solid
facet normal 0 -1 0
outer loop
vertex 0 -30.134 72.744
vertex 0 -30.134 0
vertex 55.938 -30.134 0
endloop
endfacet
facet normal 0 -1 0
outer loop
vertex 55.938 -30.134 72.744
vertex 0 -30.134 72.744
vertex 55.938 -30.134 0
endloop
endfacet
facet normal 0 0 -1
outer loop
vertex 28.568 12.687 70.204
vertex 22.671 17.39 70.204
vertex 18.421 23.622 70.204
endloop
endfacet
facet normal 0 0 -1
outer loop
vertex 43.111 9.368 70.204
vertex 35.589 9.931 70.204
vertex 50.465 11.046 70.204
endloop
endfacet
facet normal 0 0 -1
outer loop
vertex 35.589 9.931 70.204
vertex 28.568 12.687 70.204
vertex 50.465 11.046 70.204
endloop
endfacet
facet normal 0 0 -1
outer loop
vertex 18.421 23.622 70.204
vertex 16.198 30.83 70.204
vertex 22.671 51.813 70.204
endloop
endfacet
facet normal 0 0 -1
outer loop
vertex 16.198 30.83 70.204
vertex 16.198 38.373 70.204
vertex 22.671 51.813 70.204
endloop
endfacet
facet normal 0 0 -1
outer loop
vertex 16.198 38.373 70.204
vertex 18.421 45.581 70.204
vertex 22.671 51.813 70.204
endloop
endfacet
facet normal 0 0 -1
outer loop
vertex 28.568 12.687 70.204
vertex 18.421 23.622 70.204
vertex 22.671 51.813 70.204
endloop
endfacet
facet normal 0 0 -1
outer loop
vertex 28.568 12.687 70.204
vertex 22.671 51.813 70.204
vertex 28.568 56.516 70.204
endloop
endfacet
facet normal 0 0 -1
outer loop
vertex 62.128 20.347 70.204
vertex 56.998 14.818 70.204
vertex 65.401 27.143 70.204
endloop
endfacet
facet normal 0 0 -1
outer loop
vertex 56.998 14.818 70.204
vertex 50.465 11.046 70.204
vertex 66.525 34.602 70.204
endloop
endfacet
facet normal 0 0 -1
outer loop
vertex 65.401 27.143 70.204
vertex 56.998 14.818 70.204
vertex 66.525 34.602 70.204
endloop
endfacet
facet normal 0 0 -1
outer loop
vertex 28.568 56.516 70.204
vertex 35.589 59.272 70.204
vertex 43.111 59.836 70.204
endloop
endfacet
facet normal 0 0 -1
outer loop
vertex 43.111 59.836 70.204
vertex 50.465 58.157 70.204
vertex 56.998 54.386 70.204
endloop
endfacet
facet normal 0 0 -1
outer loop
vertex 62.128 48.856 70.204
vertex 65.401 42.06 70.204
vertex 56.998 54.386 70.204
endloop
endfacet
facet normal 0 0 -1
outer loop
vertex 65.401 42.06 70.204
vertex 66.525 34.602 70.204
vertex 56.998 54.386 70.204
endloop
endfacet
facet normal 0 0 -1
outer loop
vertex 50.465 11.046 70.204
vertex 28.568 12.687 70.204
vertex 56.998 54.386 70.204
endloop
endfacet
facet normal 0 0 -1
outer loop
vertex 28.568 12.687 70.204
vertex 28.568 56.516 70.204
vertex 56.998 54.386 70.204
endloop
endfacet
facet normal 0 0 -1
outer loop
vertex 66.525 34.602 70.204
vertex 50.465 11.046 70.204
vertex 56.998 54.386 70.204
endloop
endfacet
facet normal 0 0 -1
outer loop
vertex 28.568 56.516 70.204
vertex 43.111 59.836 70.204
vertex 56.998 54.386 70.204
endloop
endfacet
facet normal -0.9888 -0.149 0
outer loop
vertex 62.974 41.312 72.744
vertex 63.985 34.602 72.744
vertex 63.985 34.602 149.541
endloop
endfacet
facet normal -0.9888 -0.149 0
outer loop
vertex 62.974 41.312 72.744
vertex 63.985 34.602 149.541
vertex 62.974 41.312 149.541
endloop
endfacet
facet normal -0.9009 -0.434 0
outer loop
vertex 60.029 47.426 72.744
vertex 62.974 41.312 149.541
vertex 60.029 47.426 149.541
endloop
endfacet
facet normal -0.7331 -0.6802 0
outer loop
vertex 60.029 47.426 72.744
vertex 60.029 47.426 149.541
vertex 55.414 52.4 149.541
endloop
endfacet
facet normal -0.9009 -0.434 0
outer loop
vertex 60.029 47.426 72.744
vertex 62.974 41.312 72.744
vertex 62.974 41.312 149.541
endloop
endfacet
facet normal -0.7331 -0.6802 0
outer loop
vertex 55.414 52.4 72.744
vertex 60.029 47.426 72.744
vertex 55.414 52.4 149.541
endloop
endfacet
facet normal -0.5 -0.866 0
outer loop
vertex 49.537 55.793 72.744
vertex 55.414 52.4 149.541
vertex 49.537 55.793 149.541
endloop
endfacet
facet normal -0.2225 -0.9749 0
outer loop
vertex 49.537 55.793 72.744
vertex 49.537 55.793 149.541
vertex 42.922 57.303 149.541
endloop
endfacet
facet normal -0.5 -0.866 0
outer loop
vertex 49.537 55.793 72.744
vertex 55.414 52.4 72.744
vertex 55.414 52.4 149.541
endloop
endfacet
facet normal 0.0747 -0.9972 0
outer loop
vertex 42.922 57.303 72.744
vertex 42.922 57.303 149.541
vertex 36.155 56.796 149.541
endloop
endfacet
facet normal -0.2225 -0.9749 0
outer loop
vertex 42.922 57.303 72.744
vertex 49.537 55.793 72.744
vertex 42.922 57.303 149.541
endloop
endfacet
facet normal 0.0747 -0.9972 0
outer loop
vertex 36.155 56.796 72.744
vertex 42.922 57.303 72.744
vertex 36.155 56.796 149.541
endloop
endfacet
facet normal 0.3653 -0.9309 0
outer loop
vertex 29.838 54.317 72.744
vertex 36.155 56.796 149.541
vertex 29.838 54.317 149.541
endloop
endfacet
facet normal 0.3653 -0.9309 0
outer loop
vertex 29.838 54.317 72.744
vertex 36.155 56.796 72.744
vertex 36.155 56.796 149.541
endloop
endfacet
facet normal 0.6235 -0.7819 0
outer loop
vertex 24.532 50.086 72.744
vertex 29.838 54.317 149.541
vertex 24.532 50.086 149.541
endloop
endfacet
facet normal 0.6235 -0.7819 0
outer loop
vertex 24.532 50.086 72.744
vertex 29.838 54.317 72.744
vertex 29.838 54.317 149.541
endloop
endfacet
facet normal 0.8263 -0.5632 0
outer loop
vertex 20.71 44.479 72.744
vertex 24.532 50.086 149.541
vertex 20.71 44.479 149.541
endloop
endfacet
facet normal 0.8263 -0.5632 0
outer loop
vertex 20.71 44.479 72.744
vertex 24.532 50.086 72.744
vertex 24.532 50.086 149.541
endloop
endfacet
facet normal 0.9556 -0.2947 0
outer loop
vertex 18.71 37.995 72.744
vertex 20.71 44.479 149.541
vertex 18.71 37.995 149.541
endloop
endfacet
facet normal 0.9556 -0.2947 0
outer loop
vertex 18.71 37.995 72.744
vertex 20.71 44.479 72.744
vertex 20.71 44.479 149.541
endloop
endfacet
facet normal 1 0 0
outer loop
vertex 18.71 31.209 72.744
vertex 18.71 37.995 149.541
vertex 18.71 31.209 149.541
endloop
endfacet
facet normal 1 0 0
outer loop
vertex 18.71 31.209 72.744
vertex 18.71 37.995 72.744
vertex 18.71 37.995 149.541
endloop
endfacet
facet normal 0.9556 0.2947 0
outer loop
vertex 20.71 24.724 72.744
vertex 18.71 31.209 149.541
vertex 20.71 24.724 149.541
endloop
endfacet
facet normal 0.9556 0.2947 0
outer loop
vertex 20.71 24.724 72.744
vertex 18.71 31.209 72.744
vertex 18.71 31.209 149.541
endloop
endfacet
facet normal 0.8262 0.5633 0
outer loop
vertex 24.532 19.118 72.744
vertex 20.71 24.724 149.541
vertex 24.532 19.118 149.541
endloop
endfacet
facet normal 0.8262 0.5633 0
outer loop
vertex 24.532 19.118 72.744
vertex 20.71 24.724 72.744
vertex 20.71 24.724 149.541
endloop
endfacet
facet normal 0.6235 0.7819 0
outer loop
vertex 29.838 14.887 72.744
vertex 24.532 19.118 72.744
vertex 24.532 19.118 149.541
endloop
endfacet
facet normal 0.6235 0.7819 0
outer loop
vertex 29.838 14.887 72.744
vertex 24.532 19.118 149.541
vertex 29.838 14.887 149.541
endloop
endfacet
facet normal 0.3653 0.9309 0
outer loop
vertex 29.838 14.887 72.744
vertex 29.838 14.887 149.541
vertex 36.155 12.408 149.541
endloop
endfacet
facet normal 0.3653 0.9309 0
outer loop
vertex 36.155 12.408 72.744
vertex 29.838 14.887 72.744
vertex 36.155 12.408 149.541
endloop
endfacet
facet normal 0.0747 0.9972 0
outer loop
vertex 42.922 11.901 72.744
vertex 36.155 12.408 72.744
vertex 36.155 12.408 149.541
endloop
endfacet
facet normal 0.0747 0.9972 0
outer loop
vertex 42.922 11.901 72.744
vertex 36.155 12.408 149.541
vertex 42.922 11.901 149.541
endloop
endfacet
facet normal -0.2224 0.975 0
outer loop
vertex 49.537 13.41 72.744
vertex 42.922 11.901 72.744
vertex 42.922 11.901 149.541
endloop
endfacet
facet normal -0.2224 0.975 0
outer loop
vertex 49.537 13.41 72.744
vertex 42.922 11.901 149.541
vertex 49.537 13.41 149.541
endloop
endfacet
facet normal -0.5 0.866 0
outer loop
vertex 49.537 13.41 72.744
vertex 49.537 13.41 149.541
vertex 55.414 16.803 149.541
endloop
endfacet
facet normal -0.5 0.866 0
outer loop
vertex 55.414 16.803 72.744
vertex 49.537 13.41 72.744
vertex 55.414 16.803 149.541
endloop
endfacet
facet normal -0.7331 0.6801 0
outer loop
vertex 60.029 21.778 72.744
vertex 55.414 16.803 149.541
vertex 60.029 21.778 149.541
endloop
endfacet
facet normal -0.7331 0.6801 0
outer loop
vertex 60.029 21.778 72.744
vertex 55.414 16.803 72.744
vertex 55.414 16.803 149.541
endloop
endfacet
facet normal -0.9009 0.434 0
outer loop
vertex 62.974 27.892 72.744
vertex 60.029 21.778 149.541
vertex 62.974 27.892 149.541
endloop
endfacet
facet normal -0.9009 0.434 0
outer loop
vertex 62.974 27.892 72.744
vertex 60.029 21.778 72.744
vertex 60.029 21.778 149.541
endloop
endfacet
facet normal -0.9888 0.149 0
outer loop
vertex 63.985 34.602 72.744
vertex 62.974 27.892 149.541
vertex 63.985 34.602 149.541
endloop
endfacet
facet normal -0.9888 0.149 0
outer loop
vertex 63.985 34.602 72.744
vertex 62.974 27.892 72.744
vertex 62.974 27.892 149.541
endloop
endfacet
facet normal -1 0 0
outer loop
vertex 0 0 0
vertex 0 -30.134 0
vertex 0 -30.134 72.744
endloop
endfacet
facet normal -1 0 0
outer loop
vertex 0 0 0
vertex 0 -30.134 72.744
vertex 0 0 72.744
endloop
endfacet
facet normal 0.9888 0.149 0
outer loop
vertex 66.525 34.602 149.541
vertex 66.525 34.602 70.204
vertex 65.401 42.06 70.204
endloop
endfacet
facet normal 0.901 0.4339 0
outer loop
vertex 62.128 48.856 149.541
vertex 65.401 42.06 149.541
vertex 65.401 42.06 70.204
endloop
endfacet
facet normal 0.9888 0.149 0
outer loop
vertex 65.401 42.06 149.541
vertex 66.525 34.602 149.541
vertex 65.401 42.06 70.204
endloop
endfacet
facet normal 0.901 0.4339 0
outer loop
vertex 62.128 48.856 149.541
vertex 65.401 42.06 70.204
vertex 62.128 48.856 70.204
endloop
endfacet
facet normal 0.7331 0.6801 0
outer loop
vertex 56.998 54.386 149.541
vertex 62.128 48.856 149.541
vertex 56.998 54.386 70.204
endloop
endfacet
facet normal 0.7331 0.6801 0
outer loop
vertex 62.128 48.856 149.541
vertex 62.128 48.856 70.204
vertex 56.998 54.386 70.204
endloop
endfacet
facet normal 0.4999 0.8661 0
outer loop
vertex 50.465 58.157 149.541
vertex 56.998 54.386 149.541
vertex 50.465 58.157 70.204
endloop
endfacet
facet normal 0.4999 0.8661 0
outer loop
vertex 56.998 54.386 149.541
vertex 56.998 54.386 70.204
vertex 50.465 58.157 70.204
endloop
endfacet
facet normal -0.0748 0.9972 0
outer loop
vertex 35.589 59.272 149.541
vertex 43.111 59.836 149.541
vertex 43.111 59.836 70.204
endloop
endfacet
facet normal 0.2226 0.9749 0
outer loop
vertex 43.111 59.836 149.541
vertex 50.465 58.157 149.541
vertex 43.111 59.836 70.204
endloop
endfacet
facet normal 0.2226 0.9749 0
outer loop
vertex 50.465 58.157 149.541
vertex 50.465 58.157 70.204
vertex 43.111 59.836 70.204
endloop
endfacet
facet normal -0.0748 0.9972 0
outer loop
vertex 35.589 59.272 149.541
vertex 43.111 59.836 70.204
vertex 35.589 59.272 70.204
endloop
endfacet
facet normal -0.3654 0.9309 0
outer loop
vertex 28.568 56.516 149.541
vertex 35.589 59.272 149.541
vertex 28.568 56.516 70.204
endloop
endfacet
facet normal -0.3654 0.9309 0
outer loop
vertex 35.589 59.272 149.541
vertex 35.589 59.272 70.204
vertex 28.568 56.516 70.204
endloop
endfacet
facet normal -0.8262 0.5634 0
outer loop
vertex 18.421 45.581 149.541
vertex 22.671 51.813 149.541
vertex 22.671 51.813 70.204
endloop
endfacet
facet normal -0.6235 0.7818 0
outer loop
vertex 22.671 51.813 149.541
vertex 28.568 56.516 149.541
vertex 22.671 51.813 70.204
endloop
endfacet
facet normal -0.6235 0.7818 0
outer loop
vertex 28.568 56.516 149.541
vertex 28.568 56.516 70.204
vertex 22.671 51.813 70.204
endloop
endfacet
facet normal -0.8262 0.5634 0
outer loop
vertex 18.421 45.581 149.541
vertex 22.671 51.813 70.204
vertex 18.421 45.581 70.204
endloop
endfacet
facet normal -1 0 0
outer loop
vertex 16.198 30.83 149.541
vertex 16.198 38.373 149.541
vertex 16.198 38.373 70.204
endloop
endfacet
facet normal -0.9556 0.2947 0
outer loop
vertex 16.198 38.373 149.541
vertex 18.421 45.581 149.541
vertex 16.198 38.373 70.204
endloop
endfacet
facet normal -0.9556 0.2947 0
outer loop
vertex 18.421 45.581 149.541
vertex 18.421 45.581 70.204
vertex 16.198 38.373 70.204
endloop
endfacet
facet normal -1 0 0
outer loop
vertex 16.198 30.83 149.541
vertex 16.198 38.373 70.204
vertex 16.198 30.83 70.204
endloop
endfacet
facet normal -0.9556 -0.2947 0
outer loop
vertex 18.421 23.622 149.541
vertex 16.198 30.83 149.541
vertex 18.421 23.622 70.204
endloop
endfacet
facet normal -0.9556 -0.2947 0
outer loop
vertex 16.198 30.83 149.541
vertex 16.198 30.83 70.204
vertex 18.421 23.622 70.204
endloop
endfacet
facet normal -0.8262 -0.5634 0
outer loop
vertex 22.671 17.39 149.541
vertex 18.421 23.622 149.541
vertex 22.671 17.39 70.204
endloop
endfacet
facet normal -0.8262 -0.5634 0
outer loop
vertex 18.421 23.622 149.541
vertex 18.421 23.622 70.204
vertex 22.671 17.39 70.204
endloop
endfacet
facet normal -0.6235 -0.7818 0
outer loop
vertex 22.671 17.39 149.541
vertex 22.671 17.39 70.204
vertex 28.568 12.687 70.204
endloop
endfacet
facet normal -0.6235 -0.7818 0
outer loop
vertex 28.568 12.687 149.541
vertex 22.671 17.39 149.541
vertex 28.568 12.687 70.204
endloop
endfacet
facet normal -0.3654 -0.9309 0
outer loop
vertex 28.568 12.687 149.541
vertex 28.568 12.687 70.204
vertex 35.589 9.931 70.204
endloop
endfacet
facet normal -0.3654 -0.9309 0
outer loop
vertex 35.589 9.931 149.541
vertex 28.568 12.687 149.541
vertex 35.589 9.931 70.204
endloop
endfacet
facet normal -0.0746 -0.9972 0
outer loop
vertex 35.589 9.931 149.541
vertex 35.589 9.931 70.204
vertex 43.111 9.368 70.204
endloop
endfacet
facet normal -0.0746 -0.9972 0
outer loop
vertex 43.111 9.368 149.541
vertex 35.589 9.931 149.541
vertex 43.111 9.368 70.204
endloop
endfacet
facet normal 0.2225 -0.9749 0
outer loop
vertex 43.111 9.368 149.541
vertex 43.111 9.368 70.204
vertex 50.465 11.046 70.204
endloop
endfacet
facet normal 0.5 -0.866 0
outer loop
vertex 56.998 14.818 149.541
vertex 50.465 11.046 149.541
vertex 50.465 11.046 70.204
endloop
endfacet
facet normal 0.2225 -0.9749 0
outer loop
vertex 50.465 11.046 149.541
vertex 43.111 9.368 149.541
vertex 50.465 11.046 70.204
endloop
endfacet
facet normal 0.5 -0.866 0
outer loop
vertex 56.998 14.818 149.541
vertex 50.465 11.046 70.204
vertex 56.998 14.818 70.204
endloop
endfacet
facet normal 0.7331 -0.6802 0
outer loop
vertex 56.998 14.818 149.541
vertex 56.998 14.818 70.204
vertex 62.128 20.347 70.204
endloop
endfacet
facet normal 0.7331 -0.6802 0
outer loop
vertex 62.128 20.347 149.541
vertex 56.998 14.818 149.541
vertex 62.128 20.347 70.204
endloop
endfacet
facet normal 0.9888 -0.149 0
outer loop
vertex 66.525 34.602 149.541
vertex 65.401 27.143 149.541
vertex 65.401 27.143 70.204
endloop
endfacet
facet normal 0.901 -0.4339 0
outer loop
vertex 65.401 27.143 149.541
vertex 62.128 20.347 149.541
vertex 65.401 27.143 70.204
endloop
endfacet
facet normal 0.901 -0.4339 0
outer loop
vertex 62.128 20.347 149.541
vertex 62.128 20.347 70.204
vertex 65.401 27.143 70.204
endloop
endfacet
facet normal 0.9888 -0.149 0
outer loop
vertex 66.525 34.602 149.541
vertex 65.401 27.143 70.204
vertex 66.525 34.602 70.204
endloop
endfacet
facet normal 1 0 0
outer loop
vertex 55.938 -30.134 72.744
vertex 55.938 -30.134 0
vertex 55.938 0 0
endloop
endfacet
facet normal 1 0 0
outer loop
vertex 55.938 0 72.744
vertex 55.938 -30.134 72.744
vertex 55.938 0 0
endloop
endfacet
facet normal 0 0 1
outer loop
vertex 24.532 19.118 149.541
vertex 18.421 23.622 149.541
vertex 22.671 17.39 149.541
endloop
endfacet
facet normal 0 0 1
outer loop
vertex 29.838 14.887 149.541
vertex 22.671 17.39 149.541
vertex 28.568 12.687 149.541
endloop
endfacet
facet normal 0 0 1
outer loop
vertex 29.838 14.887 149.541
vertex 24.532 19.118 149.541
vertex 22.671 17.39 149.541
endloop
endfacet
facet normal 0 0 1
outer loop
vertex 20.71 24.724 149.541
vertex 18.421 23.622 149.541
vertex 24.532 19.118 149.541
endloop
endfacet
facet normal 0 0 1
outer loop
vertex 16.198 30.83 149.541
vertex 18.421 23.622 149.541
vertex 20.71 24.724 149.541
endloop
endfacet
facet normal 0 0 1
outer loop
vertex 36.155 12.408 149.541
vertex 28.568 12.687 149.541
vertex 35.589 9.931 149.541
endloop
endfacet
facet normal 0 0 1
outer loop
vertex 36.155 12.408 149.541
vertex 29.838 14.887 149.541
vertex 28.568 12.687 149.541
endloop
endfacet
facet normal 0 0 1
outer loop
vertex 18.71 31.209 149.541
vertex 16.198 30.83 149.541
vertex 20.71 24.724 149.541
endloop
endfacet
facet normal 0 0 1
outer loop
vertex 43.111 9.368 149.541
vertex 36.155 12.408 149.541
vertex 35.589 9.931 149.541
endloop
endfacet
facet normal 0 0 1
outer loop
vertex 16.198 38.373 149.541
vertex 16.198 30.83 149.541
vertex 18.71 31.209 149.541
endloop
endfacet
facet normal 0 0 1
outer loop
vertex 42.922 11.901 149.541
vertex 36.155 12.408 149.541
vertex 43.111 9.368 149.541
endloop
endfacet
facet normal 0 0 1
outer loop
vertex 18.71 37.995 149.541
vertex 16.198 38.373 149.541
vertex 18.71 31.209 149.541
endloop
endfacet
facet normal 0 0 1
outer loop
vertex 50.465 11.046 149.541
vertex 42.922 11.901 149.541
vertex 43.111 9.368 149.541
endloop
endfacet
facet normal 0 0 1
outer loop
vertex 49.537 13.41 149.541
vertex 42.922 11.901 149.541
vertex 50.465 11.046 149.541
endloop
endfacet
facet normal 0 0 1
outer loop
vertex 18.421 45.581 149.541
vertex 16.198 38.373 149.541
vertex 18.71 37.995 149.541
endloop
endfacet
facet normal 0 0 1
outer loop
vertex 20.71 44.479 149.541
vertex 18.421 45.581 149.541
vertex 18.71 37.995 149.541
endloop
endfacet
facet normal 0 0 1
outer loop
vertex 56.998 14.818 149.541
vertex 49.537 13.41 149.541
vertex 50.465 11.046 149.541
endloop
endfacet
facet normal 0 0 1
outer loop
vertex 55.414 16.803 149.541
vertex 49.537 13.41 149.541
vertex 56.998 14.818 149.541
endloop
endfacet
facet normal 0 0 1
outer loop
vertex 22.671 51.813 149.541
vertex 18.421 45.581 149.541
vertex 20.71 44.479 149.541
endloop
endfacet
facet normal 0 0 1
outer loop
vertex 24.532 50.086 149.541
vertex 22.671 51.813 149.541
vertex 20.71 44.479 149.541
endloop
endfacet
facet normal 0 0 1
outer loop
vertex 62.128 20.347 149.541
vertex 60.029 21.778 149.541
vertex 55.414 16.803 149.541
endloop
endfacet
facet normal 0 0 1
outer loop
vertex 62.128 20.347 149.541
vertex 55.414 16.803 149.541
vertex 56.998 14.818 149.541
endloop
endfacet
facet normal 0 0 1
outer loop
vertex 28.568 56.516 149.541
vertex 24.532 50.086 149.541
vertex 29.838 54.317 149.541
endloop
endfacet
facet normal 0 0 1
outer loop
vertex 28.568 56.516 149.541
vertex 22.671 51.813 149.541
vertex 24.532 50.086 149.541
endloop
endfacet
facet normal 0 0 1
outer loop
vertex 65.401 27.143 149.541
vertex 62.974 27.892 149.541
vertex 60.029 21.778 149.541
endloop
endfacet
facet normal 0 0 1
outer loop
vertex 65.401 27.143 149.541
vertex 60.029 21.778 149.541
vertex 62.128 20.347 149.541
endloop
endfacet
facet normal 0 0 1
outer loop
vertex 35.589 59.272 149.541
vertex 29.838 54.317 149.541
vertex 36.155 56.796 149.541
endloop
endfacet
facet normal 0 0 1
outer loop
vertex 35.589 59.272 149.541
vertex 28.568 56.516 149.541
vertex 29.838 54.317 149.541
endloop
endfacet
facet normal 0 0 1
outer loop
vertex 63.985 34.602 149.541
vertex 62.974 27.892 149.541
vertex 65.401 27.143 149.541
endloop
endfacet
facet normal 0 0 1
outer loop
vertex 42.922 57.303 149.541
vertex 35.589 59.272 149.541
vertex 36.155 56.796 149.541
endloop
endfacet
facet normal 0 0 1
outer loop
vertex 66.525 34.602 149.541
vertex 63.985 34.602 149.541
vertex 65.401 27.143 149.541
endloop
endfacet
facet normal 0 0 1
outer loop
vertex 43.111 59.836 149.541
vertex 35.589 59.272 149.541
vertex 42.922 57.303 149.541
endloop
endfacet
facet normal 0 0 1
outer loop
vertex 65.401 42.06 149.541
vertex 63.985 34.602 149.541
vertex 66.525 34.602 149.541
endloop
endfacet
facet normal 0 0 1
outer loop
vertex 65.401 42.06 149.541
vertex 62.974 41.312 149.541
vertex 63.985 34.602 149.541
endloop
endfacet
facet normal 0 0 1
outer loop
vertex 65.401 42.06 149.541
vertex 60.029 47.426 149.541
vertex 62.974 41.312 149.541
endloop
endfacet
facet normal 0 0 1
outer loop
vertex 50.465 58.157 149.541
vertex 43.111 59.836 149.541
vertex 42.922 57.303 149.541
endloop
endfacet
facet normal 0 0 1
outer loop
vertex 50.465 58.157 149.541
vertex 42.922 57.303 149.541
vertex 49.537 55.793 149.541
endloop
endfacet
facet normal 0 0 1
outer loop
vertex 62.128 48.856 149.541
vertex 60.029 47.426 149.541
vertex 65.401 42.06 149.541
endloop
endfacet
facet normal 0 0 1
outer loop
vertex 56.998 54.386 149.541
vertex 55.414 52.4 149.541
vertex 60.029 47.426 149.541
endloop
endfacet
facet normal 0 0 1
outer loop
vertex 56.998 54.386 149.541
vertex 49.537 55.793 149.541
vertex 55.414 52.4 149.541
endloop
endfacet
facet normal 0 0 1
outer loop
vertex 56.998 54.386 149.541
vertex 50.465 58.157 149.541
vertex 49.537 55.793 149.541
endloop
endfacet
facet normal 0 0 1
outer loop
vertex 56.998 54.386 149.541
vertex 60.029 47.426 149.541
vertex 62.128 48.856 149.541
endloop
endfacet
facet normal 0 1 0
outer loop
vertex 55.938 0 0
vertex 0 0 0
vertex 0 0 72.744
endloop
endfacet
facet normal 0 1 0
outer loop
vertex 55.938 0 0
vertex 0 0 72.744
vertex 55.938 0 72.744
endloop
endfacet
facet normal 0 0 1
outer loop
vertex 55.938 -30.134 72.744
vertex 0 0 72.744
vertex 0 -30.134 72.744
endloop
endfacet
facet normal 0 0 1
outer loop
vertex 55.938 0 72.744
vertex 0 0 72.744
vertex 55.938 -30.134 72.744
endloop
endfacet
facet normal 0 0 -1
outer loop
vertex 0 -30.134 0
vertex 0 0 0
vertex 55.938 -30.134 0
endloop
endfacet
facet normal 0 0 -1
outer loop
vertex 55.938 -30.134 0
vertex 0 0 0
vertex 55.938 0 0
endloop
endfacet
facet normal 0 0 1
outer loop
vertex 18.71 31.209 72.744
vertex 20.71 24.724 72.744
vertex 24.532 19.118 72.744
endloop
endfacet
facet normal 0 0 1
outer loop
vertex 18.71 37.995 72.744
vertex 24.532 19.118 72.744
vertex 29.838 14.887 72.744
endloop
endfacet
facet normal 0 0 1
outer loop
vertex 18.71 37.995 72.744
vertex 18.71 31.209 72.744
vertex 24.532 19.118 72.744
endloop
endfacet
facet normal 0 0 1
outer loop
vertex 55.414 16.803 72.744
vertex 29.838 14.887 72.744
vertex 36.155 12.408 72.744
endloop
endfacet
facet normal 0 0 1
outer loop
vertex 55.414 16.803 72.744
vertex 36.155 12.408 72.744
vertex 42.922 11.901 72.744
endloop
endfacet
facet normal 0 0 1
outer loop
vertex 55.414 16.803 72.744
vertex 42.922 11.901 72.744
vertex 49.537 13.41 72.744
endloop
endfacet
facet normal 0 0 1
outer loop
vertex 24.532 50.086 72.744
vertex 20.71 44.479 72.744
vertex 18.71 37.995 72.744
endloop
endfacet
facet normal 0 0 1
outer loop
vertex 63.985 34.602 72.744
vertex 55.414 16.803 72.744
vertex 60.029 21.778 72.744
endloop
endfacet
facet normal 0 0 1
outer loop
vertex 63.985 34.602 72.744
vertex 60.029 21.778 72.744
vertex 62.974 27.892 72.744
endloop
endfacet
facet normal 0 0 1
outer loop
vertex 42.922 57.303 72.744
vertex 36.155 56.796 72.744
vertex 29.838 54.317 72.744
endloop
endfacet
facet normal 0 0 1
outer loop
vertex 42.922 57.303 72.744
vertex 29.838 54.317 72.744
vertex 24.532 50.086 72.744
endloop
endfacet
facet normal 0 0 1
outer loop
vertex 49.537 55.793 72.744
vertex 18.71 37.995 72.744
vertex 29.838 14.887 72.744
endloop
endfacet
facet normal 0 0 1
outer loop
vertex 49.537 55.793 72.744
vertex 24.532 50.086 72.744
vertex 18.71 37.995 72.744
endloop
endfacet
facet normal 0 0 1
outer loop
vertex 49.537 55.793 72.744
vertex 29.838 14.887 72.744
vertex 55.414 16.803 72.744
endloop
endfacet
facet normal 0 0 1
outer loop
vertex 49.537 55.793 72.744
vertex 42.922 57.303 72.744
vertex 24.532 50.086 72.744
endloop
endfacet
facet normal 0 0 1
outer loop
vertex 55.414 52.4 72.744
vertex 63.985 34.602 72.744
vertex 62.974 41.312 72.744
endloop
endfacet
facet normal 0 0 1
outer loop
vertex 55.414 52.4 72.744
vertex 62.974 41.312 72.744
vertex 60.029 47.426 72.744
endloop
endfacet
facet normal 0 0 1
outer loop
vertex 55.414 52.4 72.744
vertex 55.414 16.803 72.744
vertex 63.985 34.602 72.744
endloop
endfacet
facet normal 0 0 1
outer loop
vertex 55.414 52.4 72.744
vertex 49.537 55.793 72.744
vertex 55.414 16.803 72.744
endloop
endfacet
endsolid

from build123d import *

# Parameters (mm, degrees)
F0_W     = 55.9377968311
F0_H     = 30.1342457533
F1_DEPTH = 72.7439746261
F2_R     = 22.7648481722
F3_DEPTH = 76.7965465784
F4_T     = 2.54


with BuildPart() as f1:
    # F0 (on Top) → F1 (new body)
    with BuildSketch(Plane.XY):
        with Locations((27.9688984156, -15.0671228766)):
            Rectangle(F0_W, F0_H)
    extrude(amount=F1_DEPTH)


with BuildPart() as f3:
    # F2 (on face) → F3 (new body)
    with BuildSketch(Plane.XY.offset(72.7439746261)):
        with Locations((41.2202887237, 34.6016958356)):
            Circle(F2_R)
    extrude(amount=F3_DEPTH)

    # F4
    f4_openings = [f3.faces().sort_by_distance(p)[0] for p in [
        (41.220289, 34.601696, 149.540521),
    ]]
    offset(amount=F4_T, openings=f4_openings, kind=Kind.INTERSECTION)


solid = Compound([f1.part, f3.part])
